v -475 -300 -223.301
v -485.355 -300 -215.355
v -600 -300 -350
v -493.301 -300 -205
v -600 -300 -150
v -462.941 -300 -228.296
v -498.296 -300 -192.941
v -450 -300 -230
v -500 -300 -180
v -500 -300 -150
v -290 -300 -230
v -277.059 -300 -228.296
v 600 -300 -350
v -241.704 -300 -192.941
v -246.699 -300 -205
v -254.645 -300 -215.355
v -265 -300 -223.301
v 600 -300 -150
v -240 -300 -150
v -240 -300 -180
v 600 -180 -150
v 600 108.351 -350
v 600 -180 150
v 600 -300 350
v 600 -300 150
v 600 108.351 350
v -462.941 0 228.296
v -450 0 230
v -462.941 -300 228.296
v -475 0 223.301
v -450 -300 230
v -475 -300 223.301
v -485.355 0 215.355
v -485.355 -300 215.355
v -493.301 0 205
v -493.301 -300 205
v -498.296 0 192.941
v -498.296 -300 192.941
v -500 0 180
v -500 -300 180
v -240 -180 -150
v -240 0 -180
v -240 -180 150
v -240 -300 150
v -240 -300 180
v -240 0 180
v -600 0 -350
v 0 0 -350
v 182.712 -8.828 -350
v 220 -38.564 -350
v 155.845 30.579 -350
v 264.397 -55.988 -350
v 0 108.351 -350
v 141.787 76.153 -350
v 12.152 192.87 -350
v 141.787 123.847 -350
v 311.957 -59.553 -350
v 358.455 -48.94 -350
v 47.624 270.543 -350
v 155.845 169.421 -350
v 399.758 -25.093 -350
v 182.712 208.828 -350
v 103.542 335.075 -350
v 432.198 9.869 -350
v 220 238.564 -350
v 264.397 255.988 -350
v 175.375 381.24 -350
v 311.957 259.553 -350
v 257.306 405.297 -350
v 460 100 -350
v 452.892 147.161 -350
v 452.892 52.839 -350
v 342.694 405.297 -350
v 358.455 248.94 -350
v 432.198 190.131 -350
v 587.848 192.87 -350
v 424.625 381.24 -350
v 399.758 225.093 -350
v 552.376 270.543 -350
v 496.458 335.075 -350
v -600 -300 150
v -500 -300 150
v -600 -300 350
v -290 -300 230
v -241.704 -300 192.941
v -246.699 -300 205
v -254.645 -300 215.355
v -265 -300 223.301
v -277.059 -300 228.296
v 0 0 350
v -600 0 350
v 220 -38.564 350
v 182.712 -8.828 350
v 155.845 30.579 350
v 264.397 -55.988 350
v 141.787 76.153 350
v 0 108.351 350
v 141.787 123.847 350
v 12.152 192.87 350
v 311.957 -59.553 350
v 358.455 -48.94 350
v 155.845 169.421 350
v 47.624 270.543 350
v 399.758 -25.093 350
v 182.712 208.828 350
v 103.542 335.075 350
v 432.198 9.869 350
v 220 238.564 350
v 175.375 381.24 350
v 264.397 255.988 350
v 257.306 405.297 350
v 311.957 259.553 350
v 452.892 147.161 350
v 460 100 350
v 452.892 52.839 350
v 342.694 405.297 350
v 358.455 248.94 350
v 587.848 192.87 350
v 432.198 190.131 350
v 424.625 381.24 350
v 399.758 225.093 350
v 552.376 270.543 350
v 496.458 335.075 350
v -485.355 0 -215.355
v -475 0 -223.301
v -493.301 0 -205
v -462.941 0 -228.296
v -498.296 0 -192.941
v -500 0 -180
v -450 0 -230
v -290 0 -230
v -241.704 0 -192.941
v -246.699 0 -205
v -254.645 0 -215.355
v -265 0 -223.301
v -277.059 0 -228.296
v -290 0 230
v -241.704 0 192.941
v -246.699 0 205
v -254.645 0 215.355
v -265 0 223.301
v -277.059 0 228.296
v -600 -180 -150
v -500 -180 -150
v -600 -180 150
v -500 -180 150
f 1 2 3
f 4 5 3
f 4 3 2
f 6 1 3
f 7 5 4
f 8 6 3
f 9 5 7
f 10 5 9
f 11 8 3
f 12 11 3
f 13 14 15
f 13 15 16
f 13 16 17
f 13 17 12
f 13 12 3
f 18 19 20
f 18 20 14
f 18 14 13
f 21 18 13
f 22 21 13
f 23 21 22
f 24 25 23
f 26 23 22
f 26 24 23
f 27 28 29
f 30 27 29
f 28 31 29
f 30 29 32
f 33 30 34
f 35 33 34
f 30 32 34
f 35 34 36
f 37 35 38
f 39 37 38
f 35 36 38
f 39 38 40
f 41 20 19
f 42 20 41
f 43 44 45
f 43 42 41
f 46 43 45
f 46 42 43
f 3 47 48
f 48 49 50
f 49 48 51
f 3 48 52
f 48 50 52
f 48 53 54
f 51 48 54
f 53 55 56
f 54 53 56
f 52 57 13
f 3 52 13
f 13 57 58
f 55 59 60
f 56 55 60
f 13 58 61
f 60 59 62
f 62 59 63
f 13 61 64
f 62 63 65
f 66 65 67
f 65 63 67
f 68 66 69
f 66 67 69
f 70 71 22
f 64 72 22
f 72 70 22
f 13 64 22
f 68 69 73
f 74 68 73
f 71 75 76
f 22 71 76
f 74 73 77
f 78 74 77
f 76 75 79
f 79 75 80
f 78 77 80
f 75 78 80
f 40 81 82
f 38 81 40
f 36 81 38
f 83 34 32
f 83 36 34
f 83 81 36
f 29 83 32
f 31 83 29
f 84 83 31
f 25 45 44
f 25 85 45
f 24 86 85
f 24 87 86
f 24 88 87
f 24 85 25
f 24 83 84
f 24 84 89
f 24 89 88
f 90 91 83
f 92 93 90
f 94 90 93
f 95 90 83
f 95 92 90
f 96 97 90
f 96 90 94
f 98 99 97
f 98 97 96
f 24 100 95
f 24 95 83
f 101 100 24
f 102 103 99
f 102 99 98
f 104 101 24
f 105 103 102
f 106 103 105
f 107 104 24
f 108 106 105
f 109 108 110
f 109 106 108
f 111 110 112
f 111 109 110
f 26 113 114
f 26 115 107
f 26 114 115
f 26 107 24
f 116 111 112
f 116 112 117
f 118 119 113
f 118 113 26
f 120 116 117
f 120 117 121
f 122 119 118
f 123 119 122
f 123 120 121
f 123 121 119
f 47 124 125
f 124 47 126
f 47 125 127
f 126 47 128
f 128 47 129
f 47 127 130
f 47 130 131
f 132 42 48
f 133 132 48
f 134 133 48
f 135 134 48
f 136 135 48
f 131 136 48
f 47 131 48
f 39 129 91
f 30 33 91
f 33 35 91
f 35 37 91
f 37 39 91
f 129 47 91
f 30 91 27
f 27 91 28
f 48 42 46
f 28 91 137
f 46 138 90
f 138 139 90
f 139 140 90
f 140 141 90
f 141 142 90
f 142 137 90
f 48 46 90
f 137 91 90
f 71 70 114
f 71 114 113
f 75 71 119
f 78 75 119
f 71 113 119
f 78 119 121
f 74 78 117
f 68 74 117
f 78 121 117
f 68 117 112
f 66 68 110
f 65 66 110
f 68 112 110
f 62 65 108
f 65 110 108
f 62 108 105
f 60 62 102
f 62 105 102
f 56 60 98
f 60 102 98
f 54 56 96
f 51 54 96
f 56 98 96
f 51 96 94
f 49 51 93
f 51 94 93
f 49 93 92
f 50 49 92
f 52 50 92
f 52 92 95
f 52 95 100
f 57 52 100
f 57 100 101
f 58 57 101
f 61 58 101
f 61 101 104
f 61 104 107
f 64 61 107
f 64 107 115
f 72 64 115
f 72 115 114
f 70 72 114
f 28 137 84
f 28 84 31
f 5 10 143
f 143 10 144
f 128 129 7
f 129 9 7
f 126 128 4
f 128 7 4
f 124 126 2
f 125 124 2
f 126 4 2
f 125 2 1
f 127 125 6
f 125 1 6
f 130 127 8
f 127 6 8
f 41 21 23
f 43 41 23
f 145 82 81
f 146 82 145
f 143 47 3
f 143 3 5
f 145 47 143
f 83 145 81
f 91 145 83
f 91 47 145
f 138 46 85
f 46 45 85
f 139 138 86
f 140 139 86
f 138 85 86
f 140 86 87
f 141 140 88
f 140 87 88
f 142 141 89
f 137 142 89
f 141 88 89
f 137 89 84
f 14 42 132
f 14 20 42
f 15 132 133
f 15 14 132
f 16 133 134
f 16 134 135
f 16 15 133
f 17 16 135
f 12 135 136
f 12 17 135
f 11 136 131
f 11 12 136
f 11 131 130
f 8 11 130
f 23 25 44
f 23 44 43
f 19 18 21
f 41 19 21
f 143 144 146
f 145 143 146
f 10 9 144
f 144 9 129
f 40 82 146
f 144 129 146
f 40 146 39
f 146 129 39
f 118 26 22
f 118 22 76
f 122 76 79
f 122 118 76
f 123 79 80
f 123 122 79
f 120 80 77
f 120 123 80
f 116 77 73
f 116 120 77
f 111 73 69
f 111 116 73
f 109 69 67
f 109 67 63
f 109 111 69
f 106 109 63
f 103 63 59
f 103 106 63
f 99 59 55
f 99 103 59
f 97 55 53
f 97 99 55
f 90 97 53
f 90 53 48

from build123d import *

# Parameters (mm, degrees)
F0_W      = 1200
F0_H      = 700
F1_DEPTH  = 300
F3_DEPTH  = 700
F5_W      = 240
F5_H      = 300
F6_DEPTH  = 1200.001
F7_W      = 260
F7_H      = 460
F8_DEPTH  = 300.001
F9_R      = 50
F10_R     = 160
F11_DEPTH = 700.001


with BuildPart() as f1:
    # F0 (on Front) → F1 (new body)
    with BuildSketch(Plane.XZ):
        Rectangle(F0_W, F0_H)
    extrude(amount=F1_DEPTH)

    # F2 (on face) → F3 (join)
    with BuildSketch(Plane.XY.offset(350)):
        with BuildLine():
            Line((0, 108.350513), (0, 0))
            Line((0, 0), (600, 0))
            Line((600, 0), (600, 108.350513))
            ThreePointArc((600, 108.350513), (300, 408.350513), (0, 108.350513))
        make_face()
    extrude(amount=-F3_DEPTH)

    # F5 (on face) → F6 (cut, through all)
    with BuildSketch(Plane.YZ.offset(600)):
        with Locations((-300, 0)):
            Rectangle(F5_W, F5_H)
    extrude(amount=-F6_DEPTH, mode=Mode.SUBTRACT)

    # F7 (on face) → F8 (cut, through all)
    with BuildSketch(Plane(origin=(0, 0, 0), x_dir=(-1, 0, 0), z_dir=(0, 1, 0))):
        with Locations((370, 0)):
            Rectangle(F7_W, F7_H)
    extrude(amount=-F8_DEPTH, mode=Mode.SUBTRACT)

    # F9
    f9_edges = [f1.edges().sort_by_distance(p)[0] for p in [
        (-240, -150, -230),
        (-240, -150, 230),
        (-500, -150, 230),
        (-500, -150, -230),
    ]]
    fillet(f9_edges, radius=F9_R)

    # F10 (on face) → F11 (cut, through all)
    with BuildSketch(Plane.XY.offset(350)):
        with Locations((300, 100)):
            Circle(F10_R)
    extrude(amount=-F11_DEPTH, mode=Mode.SUBTRACT)


solid = f1.part
